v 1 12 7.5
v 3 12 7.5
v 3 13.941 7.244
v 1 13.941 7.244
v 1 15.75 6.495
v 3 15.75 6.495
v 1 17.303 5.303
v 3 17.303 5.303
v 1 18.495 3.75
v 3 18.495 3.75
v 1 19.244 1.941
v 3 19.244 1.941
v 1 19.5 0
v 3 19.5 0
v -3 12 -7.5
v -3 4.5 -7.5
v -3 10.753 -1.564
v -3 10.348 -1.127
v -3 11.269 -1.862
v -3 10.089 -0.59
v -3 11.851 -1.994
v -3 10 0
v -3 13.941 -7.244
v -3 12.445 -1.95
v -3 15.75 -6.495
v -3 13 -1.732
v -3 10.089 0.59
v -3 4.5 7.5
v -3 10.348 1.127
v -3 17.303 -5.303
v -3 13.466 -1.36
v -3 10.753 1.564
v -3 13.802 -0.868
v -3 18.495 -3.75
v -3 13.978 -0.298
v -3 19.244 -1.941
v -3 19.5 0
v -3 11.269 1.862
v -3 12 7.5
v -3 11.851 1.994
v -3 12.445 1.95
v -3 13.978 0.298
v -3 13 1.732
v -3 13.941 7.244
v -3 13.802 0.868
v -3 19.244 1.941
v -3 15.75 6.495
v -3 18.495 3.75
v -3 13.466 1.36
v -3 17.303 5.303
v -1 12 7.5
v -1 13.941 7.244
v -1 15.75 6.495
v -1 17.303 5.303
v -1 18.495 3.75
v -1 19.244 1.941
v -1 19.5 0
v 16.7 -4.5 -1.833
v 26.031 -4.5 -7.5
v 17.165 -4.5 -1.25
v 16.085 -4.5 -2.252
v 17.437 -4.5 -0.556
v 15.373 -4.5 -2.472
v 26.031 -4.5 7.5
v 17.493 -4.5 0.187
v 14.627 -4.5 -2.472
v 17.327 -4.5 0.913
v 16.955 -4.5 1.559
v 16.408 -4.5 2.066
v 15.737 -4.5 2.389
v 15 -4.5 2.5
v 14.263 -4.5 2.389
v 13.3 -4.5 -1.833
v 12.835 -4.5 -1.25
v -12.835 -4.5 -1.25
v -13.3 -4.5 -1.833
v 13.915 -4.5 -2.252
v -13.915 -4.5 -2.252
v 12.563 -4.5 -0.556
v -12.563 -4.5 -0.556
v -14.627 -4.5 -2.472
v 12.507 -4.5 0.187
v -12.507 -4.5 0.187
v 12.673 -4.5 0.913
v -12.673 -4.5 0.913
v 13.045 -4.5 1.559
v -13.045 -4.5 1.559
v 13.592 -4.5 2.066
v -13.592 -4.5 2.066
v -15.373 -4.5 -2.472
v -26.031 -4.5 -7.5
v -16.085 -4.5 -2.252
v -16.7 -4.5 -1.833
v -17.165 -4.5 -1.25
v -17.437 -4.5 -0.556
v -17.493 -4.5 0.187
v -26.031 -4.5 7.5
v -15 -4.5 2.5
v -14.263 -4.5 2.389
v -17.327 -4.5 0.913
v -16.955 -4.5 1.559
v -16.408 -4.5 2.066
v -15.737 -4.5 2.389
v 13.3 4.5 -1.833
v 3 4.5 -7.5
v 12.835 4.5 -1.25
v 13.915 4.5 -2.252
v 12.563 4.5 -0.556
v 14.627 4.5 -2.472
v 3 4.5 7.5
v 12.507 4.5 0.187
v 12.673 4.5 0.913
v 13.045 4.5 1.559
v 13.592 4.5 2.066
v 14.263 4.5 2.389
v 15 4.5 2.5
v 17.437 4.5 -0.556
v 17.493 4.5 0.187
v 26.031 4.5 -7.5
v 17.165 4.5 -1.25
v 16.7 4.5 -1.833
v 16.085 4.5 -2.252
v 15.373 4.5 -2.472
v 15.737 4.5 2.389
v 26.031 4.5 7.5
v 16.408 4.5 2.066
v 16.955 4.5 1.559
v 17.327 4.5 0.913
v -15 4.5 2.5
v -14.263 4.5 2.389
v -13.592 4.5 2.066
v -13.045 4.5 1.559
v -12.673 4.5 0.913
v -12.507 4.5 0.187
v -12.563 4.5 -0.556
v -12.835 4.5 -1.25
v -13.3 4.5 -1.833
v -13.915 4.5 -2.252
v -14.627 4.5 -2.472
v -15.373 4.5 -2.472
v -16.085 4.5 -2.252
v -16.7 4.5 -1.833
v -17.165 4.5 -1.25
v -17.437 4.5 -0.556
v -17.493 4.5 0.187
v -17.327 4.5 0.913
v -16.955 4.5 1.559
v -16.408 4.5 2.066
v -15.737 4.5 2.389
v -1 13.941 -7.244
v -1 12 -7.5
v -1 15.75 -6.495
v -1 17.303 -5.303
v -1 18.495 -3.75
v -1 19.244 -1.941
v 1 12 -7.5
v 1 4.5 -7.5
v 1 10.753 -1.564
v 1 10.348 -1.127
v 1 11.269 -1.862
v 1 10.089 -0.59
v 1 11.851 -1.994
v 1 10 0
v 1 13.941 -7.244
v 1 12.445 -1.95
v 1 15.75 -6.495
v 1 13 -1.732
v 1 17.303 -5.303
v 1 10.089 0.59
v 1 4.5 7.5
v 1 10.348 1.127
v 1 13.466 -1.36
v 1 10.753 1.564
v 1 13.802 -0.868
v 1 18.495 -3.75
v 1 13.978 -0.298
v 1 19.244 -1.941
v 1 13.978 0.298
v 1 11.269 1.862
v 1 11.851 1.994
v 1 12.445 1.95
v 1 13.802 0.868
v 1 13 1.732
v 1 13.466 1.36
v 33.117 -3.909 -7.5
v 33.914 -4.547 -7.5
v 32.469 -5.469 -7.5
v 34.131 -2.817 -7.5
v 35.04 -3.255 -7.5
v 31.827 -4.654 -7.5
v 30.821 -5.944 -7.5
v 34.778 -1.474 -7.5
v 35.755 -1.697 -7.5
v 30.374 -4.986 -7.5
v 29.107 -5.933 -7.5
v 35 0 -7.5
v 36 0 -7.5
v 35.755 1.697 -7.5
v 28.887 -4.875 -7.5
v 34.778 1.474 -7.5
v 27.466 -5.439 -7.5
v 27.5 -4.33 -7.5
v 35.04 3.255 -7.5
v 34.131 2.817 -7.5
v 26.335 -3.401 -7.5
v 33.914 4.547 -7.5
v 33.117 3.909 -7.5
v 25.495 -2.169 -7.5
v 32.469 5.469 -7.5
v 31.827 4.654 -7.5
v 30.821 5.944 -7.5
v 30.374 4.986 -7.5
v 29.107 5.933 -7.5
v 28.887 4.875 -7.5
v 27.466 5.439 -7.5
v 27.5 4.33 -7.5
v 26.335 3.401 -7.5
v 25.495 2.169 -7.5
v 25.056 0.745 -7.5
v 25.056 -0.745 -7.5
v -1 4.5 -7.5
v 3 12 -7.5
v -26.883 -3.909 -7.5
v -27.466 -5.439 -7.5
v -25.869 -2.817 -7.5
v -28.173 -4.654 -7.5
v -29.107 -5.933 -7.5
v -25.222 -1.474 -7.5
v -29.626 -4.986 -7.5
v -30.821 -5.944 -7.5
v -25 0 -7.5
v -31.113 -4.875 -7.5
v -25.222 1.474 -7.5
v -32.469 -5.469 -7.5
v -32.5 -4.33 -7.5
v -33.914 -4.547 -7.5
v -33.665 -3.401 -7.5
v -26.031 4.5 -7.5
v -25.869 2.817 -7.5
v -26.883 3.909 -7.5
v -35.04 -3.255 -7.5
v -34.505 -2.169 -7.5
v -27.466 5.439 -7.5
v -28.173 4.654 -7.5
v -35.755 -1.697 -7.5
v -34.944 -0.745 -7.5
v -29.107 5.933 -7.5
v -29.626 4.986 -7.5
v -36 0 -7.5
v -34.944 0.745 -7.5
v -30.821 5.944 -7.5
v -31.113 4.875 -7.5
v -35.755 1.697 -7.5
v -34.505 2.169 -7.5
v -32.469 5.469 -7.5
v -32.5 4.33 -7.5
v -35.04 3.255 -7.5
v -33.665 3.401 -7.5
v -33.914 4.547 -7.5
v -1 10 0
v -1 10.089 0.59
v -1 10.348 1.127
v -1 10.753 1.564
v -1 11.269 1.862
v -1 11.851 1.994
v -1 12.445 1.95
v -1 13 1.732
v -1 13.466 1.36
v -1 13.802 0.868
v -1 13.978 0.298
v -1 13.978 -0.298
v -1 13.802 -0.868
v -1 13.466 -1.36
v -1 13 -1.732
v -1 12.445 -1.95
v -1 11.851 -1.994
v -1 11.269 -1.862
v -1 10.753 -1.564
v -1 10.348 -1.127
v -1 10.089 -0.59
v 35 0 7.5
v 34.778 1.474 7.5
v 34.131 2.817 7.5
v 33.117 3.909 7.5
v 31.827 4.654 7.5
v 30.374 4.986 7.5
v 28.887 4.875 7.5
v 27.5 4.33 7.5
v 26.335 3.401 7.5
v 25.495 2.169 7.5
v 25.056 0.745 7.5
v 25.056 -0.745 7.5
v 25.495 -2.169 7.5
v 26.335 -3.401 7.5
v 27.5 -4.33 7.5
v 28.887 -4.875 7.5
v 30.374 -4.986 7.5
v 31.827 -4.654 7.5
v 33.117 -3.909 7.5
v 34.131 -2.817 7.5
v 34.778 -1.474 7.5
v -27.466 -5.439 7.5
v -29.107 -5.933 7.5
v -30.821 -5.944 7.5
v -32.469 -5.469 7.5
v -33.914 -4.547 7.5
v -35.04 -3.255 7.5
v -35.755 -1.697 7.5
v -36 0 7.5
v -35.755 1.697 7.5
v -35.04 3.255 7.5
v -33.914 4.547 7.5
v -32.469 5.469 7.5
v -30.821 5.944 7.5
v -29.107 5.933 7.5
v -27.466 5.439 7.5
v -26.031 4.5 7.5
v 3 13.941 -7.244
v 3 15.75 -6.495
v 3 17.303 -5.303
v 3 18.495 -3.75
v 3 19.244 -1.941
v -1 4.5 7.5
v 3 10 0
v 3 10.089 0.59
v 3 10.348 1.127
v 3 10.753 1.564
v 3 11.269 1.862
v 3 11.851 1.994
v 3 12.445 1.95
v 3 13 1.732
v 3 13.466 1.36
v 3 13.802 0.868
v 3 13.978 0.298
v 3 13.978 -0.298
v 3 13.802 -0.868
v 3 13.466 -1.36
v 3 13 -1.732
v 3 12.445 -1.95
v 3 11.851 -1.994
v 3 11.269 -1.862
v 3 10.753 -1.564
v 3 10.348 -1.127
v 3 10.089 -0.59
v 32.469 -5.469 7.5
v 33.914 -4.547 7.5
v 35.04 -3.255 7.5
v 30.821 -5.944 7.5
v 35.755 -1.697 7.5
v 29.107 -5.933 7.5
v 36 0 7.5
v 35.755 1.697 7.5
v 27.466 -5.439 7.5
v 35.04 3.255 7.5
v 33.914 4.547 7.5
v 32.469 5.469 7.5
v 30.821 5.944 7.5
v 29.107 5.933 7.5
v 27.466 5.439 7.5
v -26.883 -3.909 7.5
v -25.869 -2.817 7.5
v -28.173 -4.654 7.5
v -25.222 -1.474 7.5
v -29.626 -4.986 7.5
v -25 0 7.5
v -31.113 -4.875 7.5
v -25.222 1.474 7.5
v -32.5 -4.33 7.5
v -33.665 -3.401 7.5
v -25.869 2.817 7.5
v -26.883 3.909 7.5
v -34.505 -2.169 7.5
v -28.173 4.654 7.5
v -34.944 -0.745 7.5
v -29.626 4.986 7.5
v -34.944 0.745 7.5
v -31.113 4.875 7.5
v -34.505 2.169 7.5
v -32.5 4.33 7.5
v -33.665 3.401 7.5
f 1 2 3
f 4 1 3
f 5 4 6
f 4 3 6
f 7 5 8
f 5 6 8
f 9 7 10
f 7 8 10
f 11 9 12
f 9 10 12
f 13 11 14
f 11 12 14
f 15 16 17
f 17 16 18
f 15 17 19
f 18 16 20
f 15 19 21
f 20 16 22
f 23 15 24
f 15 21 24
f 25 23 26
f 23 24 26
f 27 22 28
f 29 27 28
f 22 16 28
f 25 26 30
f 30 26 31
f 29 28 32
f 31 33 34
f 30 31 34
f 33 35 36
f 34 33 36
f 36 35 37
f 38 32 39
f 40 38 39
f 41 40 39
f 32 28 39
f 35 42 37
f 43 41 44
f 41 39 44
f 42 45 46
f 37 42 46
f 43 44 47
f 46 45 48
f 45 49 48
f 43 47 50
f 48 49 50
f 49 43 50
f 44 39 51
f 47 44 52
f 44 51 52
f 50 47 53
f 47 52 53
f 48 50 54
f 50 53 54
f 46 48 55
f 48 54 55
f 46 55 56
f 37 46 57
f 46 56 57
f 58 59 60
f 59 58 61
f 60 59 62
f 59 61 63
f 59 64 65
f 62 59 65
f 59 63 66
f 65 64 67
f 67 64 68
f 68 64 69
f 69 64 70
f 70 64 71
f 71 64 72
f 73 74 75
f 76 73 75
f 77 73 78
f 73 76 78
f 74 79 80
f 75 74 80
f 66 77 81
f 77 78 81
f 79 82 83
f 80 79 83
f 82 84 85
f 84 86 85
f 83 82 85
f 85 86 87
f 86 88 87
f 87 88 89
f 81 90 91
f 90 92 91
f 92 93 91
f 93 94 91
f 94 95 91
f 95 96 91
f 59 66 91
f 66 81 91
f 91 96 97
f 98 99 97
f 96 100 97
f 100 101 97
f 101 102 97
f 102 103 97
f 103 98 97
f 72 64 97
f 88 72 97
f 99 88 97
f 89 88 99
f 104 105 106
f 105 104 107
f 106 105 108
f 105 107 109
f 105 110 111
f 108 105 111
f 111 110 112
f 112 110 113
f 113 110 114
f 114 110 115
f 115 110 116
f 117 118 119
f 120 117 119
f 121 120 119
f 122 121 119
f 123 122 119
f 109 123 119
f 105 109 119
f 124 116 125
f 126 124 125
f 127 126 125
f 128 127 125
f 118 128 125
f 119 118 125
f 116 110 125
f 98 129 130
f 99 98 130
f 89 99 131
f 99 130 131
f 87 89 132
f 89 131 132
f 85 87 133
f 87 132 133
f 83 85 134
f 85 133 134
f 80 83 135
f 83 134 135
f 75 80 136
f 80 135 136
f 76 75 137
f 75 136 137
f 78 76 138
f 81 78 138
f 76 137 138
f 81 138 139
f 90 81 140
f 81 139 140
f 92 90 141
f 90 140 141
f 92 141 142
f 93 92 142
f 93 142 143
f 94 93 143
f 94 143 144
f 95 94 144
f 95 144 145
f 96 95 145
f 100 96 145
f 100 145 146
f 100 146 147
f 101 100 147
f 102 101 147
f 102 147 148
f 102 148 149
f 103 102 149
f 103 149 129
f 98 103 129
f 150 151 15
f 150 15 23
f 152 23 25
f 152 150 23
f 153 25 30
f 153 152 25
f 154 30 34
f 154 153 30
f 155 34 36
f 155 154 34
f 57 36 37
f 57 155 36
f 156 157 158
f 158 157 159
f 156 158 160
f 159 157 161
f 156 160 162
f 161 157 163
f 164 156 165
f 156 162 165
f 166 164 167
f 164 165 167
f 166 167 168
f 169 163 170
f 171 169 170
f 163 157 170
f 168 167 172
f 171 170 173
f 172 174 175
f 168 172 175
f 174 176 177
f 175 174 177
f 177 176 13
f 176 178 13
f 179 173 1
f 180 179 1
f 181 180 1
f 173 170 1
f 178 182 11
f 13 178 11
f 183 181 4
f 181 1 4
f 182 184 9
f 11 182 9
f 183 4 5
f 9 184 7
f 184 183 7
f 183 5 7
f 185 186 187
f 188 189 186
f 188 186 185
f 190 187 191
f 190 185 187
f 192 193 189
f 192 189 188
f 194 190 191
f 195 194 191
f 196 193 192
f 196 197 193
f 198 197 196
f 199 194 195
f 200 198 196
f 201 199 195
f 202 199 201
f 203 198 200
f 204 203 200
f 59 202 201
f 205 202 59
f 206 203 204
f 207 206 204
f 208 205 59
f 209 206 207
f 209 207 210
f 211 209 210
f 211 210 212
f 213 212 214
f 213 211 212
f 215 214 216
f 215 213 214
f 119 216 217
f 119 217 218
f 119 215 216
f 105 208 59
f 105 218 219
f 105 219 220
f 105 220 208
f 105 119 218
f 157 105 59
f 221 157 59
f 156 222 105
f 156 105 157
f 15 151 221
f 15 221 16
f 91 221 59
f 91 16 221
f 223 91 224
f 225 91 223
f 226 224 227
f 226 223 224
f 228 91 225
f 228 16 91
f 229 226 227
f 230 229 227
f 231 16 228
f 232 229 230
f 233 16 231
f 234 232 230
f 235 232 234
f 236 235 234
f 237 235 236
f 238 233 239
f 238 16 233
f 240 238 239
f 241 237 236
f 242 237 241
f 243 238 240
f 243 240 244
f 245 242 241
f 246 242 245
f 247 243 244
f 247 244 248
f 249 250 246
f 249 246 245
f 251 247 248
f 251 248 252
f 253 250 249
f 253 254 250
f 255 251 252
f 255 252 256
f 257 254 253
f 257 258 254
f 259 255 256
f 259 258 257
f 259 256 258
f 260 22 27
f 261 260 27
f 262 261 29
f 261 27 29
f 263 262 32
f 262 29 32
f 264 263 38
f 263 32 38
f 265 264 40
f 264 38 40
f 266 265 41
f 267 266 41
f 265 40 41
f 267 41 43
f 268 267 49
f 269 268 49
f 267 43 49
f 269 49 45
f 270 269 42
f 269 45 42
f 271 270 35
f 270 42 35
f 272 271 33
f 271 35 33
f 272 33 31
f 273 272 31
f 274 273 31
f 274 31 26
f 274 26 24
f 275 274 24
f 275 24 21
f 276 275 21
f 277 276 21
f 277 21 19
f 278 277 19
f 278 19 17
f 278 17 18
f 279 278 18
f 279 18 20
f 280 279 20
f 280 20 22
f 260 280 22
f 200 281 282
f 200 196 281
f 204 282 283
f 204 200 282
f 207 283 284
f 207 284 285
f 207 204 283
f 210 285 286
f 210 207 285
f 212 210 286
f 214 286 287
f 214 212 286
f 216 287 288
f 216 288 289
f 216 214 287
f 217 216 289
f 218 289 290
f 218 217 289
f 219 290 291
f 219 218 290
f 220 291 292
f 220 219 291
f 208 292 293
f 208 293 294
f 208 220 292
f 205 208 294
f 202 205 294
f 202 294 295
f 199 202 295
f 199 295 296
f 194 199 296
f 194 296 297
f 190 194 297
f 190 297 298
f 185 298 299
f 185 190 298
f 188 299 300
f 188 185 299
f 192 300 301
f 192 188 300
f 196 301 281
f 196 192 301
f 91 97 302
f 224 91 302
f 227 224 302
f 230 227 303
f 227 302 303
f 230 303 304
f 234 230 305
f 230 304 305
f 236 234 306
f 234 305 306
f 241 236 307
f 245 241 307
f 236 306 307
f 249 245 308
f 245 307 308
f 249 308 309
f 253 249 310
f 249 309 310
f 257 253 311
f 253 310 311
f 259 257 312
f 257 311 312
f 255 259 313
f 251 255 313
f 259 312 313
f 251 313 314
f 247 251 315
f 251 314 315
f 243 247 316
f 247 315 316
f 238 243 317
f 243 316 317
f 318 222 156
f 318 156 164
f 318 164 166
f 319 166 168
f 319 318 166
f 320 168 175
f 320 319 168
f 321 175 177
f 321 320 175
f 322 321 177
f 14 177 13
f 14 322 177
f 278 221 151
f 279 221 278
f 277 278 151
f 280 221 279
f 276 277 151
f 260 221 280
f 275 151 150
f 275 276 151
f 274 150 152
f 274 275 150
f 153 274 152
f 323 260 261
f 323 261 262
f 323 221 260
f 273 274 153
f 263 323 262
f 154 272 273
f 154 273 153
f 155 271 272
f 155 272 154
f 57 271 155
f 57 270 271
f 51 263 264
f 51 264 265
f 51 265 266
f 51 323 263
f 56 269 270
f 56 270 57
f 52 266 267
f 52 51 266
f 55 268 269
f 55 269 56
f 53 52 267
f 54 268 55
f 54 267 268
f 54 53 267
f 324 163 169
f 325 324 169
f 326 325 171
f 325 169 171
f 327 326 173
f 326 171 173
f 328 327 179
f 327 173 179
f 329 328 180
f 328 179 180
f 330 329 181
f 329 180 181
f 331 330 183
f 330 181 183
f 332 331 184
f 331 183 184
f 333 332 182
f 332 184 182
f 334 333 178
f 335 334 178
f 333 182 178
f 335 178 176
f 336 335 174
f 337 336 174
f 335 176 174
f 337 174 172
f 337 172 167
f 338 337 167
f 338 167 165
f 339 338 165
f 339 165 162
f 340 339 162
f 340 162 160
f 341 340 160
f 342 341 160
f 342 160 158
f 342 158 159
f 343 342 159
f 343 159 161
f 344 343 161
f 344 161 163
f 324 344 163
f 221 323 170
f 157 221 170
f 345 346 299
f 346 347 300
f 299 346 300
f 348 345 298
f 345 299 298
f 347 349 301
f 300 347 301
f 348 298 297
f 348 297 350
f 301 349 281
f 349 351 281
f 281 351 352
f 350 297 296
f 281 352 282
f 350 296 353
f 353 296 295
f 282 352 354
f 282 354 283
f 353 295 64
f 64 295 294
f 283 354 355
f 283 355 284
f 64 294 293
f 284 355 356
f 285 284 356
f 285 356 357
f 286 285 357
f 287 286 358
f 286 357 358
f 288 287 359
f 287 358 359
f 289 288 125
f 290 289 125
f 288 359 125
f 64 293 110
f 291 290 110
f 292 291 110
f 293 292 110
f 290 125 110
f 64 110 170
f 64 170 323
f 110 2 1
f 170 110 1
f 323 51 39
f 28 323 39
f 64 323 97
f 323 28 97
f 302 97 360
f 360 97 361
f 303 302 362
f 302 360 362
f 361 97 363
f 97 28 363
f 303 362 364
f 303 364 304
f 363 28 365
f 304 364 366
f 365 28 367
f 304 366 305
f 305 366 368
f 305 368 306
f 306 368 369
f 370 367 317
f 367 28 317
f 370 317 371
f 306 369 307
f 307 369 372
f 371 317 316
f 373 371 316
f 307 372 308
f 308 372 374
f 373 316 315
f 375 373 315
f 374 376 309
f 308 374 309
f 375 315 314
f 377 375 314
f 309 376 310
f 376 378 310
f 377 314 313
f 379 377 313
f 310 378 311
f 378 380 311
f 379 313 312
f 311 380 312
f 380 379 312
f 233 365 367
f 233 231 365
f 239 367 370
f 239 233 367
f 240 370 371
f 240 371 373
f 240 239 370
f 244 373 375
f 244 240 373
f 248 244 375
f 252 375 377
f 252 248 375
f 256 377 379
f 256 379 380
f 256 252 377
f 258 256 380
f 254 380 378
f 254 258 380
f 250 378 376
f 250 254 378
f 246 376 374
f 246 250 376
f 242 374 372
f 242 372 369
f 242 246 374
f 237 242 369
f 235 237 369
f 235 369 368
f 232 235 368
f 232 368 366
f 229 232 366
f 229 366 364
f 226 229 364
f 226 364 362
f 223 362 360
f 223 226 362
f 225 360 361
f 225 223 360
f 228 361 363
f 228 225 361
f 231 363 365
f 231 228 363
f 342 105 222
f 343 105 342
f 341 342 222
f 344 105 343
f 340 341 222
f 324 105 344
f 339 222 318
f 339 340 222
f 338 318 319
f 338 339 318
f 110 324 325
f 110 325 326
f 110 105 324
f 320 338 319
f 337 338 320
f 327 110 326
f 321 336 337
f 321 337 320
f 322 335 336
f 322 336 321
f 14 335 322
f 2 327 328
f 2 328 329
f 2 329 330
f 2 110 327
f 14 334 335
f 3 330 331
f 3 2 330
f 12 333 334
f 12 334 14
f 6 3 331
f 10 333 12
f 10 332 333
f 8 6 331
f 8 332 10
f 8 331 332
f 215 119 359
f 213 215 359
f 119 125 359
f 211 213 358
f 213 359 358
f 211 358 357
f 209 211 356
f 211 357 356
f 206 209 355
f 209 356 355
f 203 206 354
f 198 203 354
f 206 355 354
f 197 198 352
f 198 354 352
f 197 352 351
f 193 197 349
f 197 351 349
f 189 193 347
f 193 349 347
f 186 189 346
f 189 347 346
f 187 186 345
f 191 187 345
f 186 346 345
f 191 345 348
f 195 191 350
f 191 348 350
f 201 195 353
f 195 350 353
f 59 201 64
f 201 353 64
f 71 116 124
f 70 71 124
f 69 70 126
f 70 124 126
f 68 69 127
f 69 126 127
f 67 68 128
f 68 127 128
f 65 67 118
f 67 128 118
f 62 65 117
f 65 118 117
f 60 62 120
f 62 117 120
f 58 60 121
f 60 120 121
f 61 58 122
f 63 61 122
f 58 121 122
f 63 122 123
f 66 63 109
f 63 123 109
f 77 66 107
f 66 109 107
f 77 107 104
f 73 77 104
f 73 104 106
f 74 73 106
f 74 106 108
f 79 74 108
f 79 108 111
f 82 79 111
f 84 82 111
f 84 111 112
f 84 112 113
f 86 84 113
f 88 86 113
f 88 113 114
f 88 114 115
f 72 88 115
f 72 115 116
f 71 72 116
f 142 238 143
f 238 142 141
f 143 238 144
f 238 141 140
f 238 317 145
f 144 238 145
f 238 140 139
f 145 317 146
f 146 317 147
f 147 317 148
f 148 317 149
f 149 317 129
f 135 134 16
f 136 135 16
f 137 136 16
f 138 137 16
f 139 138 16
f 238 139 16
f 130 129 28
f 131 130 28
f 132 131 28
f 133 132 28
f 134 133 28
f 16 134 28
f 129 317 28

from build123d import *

# Parameters (mm, degrees)
SKETCH_1_R          = 5
EXTRUDE_1_DEPTH     = 7.5
SKETCH_2_W          = 6
SKETCH_2_H          = 15
EXTRUDE_2_DEPTH     = 15
FILLET_1_R          = 7.5
SKETCH_3_W          = 2
SKETCH_3_H          = 15
CUT_EXTRUDE_1_DEPTH = 44.603325561
SKETCH_4_R          = 2
CUT_EXTRUDE_2_DEPTH = 15
SKETCH_7_R          = 2.5
CUT_EXTRUDE_3_DEPTH = 40.714606885


with BuildPart() as part:
    # 草图1 → 凸台-拉伸1 (new, symmetric)
    with BuildSketch(Plane.XY):
        with BuildLine():
            Line((-26.031373033, 4.5), (26.031373033, 4.5))
            ThreePointArc((26.031373033, 4.5), (36, 0), (26.031373033, -4.5))
            Line((26.031373033, -4.5), (-26.031373033, -4.5))
            ThreePointArc((-26.031373033, -4.5), (-36, 0), (-26.031373033, 4.5))
        make_face()
        with Locations((-30, 0)):
            Circle(SKETCH_1_R, mode=Mode.SUBTRACT)
        with Locations((30, 0)):
            Circle(SKETCH_1_R, mode=Mode.SUBTRACT)
    extrude(amount=EXTRUDE_1_DEPTH, both=True)

    # 草图2 → 凸台-拉伸2 (add)
    with BuildSketch(Plane.XY.offset(7.5)):
        with Locations((0, 12)):
            Rectangle(SKETCH_2_W, SKETCH_2_H)
    extrude(amount=-EXTRUDE_2_DEPTH)

    # 圆角1
    fillet_1_edges = [part.edges().sort_by_distance(p)[0] for p in [
        (0, 19.5, 7.5),
        (0, 19.5, -7.5),
    ]]
    fillet(fillet_1_edges, radius=FILLET_1_R - 0.0001)  # a hair under: the kernel refuses the full size

    # 草图3 → 切除-拉伸1 (cut, through all)
    with BuildSketch(Plane.XY.offset(7.5)):
        with Locations((0, 12)):
            Rectangle(SKETCH_3_W, SKETCH_3_H)
    extrude(amount=-CUT_EXTRUDE_1_DEPTH, mode=Mode.SUBTRACT)

    # 草图4 → 切除-拉伸2 (cut)
    with BuildSketch(Plane.ZY.offset(3)):
        with Locations(Location((0, 12, 0), (0, 0, 270))):
            Circle(SKETCH_4_R)
    extrude(amount=-CUT_EXTRUDE_2_DEPTH, mode=Mode.SUBTRACT)

    # 草图7 → 切除-拉伸3 (cut, through all)
    with BuildSketch(Plane(origin=(0, 4.5, 0), x_dir=(1, 0, 0), z_dir=(0, 1, 0))):
        with Locations(Location((-15, 0, 0), (0, 0, 270))):
            Circle(SKETCH_7_R)
        with Locations(Location((15, 0, 0), (0, 0, 270))):
            Circle(SKETCH_7_R)
    extrude(amount=-CUT_EXTRUDE_3_DEPTH, mode=Mode.SUBTRACT)


solid = part.part
